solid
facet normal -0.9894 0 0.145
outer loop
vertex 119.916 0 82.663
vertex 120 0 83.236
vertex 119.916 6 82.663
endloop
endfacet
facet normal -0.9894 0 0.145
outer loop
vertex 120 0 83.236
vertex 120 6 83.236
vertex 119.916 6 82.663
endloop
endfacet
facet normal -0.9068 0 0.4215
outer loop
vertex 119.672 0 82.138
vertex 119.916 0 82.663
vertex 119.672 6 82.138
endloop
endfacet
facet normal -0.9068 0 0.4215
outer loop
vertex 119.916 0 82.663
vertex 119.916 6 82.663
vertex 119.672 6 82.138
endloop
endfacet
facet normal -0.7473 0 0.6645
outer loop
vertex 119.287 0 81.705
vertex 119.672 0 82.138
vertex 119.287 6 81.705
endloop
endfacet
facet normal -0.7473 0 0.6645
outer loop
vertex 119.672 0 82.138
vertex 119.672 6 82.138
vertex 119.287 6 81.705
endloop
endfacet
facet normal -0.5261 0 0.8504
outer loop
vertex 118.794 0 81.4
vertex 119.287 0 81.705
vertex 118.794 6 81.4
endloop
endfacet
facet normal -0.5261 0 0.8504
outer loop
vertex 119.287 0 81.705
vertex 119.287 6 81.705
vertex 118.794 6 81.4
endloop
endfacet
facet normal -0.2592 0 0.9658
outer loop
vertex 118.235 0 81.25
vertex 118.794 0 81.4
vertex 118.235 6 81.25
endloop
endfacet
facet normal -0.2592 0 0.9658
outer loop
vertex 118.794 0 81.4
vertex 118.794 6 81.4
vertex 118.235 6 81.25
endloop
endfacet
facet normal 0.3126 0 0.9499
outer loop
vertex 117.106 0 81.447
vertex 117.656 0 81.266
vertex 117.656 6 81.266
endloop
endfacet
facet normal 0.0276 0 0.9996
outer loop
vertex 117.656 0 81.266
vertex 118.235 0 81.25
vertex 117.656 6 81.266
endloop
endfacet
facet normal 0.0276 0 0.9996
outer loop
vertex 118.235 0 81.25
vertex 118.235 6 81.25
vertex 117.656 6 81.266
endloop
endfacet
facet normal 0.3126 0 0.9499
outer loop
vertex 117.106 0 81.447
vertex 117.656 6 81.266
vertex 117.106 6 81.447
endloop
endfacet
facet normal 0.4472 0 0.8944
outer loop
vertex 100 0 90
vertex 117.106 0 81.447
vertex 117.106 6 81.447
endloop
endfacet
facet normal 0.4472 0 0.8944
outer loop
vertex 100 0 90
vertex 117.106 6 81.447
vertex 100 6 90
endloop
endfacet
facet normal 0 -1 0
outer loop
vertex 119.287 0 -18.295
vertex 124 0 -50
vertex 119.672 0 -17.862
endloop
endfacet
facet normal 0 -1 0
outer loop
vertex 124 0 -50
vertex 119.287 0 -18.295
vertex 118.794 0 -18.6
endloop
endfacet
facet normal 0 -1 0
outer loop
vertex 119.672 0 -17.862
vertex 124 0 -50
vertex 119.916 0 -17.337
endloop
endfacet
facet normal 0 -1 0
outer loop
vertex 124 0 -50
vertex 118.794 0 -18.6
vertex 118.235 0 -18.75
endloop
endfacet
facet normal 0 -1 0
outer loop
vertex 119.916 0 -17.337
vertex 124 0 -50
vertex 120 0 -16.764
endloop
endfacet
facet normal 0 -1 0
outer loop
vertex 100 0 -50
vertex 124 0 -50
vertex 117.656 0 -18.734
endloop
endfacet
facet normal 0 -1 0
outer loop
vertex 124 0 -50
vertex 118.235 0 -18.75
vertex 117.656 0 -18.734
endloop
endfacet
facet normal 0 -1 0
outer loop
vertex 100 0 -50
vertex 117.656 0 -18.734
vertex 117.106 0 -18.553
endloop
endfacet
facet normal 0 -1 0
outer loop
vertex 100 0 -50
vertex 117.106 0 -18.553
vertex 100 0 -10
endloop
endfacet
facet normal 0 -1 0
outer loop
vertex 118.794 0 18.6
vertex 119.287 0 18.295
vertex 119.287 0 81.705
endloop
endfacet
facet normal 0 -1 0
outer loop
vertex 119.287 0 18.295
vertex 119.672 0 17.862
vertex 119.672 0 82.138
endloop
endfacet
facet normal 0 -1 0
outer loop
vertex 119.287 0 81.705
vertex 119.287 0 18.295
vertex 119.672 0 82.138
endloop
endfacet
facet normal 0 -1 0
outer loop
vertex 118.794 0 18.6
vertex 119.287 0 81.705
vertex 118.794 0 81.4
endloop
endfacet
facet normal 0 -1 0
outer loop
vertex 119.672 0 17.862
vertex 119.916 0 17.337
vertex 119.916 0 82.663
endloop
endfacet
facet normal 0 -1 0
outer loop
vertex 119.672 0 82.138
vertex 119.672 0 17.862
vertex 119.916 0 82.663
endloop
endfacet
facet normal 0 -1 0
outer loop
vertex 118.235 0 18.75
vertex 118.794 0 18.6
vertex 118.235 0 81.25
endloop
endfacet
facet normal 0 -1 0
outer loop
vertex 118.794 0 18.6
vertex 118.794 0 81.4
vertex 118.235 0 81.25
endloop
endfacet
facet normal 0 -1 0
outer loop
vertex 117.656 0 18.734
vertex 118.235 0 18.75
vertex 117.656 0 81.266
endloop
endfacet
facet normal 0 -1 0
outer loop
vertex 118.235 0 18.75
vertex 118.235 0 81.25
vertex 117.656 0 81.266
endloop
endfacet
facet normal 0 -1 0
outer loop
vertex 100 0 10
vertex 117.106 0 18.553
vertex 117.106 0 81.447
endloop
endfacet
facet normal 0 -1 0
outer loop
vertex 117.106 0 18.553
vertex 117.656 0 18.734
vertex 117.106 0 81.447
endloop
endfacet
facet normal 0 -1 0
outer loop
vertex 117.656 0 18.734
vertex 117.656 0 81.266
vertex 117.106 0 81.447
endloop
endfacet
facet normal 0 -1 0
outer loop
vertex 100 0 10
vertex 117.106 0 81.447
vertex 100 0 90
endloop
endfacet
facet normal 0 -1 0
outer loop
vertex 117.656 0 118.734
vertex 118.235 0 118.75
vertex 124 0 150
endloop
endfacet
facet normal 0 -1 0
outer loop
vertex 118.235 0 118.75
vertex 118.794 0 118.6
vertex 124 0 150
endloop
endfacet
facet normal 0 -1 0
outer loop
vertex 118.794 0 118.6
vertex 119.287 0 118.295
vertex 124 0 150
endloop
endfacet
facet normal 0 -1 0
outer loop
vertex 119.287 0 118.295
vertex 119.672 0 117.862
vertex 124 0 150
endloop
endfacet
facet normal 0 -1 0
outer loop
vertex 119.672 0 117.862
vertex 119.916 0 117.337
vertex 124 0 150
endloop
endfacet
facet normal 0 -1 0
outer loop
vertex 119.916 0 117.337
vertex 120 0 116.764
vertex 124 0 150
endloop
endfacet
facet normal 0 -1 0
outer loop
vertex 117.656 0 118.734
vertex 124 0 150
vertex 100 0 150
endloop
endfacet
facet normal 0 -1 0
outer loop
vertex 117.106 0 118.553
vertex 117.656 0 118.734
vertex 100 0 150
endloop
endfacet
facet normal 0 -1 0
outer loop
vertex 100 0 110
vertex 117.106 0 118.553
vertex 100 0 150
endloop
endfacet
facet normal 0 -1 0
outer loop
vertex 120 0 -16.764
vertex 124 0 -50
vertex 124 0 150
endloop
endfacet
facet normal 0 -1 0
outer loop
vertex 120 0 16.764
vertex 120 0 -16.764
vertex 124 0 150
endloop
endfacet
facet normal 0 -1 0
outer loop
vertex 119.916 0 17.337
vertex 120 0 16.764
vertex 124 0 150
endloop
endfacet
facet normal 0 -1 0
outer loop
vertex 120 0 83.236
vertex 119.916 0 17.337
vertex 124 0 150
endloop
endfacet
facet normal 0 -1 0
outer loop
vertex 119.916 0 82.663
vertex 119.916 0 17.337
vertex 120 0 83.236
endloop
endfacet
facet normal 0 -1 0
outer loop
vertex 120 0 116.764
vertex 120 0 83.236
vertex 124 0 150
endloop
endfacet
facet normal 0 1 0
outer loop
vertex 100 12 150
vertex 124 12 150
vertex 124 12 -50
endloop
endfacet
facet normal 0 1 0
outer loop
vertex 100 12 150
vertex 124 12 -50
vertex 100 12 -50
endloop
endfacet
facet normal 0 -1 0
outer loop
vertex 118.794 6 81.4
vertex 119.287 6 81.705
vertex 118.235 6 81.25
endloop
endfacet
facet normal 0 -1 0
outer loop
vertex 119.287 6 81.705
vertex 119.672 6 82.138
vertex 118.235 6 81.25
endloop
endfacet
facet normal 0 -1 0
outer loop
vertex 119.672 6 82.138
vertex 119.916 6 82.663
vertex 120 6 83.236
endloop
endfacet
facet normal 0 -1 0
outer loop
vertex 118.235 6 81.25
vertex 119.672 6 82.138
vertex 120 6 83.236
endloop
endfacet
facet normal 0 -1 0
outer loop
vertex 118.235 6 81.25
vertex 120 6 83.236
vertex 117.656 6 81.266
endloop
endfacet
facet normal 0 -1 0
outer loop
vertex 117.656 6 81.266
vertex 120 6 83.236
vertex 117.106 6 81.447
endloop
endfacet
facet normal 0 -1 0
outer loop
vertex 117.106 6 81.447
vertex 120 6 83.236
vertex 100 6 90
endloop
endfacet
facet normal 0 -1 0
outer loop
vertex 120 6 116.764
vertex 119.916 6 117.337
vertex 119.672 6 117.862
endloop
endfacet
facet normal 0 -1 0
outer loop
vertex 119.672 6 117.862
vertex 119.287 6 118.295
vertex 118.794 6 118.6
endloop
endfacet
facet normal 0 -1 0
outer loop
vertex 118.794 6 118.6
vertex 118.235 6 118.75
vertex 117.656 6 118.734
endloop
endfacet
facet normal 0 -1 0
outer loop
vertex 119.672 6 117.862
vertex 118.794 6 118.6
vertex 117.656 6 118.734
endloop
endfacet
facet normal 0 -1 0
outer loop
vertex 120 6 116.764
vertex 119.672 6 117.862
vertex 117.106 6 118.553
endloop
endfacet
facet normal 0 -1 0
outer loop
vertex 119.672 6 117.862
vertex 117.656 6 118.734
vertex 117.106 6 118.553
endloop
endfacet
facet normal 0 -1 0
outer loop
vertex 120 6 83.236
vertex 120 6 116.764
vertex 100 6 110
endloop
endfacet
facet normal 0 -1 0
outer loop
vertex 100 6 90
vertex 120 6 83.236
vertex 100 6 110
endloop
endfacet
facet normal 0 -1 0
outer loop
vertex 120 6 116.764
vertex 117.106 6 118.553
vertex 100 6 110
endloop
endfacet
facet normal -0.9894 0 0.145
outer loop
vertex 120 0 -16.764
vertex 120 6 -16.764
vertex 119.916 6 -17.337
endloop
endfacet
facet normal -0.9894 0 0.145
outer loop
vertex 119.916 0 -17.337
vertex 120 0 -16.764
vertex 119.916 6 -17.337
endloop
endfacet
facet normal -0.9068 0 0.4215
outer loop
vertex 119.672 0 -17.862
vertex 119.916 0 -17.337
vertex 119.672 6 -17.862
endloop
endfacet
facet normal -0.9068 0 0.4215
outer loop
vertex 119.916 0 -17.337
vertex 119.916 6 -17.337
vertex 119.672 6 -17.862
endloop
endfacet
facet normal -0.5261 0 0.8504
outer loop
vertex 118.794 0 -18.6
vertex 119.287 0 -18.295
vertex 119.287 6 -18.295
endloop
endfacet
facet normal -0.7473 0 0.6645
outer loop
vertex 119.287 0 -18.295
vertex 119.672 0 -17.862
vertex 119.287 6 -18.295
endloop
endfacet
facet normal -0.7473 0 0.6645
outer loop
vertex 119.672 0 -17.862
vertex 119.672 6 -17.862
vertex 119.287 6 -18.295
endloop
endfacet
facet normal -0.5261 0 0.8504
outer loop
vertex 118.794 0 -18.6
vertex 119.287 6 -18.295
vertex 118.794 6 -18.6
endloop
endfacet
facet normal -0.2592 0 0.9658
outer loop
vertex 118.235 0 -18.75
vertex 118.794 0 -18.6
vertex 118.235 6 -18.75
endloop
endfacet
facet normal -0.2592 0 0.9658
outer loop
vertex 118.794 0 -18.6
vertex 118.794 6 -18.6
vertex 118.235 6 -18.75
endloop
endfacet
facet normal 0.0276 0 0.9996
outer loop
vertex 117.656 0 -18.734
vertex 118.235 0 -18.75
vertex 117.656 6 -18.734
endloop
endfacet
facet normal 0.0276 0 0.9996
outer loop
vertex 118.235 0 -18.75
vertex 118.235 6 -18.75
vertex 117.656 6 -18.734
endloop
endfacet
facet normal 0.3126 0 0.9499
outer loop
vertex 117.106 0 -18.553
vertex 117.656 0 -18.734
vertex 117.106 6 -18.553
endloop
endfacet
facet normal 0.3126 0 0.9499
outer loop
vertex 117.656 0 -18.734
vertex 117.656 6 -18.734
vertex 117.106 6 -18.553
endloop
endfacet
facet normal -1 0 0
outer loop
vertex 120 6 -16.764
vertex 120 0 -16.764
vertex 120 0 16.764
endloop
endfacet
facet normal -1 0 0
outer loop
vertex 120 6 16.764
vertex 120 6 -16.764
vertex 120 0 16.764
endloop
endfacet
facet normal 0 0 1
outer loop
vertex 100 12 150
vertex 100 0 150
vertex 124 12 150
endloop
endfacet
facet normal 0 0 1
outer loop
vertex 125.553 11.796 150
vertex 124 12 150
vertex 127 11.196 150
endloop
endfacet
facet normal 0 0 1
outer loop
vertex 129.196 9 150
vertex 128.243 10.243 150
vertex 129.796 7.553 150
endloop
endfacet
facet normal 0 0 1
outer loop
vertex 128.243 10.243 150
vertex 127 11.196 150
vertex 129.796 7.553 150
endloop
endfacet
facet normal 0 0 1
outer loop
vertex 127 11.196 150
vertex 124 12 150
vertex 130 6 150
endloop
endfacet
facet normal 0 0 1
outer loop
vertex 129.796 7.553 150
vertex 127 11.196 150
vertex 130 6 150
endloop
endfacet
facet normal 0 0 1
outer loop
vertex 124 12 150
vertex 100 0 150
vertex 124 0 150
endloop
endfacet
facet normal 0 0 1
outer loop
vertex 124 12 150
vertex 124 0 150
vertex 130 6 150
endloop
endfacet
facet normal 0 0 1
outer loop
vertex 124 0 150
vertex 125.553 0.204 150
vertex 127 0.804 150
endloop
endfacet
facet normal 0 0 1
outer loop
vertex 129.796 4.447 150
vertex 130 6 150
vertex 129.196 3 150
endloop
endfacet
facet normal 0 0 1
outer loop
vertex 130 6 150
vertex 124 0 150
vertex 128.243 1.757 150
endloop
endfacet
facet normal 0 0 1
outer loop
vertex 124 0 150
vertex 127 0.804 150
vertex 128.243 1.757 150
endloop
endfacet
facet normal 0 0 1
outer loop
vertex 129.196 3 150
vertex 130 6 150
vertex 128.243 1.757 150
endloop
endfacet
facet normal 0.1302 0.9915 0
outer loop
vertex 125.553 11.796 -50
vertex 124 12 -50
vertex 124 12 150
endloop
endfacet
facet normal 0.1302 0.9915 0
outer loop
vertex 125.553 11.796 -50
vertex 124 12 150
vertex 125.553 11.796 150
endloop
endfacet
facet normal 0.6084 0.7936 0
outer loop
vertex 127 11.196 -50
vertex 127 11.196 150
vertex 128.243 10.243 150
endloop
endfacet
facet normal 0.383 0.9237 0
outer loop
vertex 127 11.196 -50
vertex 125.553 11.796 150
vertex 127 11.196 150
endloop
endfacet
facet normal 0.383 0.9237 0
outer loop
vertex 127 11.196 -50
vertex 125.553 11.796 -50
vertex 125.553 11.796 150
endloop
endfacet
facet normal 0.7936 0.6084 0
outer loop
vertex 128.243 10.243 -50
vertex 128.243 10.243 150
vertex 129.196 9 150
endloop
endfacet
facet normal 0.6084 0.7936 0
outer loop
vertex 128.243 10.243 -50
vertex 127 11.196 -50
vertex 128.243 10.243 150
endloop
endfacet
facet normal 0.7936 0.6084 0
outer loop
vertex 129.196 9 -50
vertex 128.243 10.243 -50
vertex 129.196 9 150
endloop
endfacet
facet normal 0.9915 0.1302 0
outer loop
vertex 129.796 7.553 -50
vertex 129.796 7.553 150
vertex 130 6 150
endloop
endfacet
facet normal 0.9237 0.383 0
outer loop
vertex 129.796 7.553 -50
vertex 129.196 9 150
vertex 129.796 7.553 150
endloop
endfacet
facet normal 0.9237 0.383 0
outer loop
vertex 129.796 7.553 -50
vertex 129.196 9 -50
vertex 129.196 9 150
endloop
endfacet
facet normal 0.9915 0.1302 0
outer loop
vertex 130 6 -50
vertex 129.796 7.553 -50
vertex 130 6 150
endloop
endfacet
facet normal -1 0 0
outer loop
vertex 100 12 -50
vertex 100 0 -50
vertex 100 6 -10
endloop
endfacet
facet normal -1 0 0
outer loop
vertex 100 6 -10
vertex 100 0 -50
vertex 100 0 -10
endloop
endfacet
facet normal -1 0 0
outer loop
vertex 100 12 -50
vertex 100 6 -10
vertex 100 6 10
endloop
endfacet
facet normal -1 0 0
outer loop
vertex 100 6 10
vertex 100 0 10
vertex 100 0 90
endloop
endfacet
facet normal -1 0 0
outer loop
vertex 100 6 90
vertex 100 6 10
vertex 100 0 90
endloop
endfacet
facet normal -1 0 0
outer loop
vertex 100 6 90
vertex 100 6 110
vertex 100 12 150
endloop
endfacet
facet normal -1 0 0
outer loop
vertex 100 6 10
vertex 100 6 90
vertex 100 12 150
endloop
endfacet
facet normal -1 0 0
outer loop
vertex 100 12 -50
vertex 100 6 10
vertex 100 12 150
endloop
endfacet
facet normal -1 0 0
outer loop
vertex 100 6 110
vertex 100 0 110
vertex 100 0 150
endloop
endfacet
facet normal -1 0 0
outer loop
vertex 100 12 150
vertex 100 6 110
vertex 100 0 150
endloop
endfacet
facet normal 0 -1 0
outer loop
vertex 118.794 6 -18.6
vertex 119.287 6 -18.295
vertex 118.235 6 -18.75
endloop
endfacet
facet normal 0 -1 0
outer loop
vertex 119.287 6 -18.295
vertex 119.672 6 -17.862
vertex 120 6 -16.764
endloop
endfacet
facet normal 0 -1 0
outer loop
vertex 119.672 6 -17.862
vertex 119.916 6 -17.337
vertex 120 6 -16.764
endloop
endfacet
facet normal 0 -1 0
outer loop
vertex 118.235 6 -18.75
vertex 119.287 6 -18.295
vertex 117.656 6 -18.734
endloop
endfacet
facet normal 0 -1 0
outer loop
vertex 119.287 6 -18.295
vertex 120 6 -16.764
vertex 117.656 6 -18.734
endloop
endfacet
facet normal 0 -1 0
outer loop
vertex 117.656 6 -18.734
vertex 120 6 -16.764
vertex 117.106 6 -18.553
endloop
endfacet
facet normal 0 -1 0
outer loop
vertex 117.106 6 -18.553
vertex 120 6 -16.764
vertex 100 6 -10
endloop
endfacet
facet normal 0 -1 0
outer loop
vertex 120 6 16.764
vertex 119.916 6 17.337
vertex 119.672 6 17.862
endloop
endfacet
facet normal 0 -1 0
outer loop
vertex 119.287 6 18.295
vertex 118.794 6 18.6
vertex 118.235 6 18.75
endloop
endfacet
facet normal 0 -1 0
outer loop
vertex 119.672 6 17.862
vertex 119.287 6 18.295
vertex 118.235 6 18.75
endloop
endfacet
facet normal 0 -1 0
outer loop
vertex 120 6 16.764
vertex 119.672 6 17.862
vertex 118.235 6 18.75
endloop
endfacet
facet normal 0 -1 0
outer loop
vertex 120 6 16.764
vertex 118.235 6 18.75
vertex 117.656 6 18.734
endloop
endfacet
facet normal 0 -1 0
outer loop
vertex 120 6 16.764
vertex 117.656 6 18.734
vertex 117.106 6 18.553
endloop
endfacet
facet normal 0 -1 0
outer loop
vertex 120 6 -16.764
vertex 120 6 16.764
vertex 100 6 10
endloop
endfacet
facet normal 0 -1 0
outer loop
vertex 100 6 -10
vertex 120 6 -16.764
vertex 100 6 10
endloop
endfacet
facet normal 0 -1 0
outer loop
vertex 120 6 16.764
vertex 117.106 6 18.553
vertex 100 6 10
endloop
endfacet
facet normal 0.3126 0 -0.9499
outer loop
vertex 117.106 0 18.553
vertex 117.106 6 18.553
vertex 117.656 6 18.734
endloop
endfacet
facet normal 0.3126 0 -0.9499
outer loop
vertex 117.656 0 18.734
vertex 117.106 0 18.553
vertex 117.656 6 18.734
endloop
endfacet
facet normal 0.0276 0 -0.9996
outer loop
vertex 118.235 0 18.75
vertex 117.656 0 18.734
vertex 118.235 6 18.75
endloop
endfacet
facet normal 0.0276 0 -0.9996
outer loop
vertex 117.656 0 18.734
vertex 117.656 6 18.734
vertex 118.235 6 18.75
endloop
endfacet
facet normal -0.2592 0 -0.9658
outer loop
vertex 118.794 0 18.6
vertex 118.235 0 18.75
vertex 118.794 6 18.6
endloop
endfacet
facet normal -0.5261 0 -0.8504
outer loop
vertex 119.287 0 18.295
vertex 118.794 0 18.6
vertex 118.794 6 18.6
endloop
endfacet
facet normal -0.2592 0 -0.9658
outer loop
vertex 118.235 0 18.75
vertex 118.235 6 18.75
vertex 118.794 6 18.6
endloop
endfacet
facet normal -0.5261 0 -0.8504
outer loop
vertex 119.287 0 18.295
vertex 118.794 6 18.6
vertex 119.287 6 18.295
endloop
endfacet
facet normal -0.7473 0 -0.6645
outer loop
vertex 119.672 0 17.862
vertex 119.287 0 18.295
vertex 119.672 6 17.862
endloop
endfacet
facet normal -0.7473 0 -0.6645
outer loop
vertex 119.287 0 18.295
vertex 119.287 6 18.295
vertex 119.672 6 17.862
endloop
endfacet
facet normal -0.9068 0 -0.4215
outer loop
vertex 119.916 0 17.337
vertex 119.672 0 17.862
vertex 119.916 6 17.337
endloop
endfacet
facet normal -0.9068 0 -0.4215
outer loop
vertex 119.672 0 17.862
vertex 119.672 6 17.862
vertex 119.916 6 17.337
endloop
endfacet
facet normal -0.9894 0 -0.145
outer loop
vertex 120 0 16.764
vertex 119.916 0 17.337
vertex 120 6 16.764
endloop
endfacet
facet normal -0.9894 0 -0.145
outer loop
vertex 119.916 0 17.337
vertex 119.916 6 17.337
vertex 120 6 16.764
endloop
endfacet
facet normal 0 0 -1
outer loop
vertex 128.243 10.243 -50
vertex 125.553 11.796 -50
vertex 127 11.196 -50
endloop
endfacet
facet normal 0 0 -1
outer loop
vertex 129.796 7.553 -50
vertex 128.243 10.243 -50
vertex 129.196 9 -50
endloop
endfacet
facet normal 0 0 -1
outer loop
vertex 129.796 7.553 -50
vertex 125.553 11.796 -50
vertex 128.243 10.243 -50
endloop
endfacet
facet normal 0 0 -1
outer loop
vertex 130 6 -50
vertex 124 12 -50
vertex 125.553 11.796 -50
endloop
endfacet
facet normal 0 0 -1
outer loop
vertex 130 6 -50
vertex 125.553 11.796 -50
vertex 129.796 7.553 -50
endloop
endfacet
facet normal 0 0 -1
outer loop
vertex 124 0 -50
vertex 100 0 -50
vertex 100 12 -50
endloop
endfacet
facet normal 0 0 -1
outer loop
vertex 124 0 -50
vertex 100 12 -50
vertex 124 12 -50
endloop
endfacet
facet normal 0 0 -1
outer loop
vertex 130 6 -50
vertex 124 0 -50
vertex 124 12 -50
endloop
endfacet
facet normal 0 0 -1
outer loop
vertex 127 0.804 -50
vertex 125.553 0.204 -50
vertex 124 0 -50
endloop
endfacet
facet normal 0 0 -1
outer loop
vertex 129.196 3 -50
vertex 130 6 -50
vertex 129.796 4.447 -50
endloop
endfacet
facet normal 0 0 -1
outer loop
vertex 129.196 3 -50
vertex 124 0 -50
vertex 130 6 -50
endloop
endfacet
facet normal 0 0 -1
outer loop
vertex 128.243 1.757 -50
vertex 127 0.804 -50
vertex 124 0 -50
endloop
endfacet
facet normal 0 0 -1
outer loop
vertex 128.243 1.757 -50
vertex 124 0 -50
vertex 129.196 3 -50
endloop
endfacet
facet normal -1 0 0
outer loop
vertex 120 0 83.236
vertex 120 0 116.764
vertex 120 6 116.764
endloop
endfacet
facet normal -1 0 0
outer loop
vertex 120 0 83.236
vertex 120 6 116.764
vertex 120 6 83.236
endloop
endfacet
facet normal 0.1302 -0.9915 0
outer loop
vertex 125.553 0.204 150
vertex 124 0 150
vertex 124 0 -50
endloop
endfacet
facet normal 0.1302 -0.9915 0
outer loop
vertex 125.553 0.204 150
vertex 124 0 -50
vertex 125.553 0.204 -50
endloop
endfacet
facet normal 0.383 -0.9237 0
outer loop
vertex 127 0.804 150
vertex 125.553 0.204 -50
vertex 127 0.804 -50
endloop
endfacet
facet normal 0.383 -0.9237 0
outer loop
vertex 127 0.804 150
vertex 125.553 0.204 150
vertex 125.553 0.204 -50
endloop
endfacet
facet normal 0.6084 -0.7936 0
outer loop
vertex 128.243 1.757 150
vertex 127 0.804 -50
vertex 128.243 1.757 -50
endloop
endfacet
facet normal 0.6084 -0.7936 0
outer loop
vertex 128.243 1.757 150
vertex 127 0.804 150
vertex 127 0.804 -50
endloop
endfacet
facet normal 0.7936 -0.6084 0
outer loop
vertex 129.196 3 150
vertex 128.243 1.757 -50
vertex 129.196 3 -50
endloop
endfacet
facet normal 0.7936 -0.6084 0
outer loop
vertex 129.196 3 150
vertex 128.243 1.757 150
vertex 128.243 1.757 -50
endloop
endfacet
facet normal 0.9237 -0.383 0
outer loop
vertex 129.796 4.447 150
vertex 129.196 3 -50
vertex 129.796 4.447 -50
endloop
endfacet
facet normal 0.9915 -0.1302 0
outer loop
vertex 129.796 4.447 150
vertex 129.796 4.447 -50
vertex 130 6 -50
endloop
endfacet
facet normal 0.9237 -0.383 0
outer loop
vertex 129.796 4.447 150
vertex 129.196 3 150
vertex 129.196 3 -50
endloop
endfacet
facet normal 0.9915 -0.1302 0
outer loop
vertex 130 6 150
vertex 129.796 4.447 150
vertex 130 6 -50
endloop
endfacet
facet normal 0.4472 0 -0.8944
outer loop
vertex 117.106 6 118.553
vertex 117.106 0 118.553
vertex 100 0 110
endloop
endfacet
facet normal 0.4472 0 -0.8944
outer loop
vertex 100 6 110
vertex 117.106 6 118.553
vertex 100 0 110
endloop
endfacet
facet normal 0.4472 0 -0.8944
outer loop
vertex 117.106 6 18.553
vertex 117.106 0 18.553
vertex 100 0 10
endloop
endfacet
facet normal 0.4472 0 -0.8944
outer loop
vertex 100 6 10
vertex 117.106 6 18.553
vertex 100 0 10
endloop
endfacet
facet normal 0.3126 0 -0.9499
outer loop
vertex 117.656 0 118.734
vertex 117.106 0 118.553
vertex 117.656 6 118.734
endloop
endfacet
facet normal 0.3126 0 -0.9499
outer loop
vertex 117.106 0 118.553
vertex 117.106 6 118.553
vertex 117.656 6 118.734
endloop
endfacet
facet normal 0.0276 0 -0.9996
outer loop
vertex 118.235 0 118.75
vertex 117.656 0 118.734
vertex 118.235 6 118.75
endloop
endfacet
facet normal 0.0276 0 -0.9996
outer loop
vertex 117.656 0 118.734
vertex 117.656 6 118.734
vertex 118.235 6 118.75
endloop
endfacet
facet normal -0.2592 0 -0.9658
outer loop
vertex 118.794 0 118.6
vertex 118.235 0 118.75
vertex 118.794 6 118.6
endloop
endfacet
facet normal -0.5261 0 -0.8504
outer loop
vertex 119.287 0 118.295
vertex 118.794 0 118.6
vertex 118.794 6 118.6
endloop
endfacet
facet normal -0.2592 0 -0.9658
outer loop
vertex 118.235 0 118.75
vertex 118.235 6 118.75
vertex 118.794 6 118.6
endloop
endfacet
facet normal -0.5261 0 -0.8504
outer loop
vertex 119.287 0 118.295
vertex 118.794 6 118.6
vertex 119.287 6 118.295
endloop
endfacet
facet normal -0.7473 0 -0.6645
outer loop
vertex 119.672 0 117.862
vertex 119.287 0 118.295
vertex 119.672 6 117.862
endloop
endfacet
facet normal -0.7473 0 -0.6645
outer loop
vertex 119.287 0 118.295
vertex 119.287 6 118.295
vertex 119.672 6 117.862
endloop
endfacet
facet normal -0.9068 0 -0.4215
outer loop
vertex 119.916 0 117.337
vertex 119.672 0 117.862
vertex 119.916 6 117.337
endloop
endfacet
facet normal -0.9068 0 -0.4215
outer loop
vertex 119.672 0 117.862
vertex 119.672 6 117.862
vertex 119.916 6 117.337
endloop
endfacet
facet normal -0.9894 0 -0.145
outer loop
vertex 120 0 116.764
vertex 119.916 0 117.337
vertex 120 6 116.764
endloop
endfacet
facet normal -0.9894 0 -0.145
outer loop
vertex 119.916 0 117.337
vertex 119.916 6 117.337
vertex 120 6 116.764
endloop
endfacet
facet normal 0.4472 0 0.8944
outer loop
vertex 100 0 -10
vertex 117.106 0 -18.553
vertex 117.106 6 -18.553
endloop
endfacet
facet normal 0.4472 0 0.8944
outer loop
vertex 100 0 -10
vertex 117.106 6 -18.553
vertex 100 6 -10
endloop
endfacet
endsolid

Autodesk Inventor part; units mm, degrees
ref_plane "YZ Plane" through (0, 0, 0) normal (1, 0, 0) x (0, 1, 0)
ref_plane "XZ Plane" through (0, 0, 0) normal (0, 1, 0) x (-1, 0, 0)
ref_plane "XY Plane" through (0, 0, 0) normal (0, 0, 1) x (1, 0, 0)
sketch "Sketch1" plane through (0, 0, 0) normal (0, 1, 0) x (-1, 0, 0)
  line L0 (100, -50) -> (-100, -50)
  line L1 (-100, -50) -> (-100, 50)
  line L2 (-100, 50) -> (100, 50)
  line L3 (100, 50) -> (100, -50)
  line L4 (100, -50) -> (-100, 50) construction
  line L5 (-100, -50) -> (100, 50) construction
  line L6 (-40, -30) -> (-80, -30)
  line L7 (-50, -50) -> (-70, -50)
  line L8 (-40, -30) -> (-50, -50)
  line L9 (-80, -30) -> (-70, -50)
  line L10 (80, -30) -> (40, -30)
  line L11 (70, -50) -> (50, -50)
  line L12 (80, -30) -> (70, -50)
  line L13 (40, -30) -> (50, -50)
  line L14 (-100, -10) -> (-100, 10)
  line L15 (-80, -20) -> (-80, 20)
  line L16 (-80, -20) -> (-100, -10)
  line L17 (-80, 20) -> (-100, 10)
  line L18 (100, -50) -> (-100, -50)
  line L19 (-100, -50) -> (-130, -50)
  line L20 (-130, -50) -> (-130, 50)
  line L21 (-130, 50) -> (-100, 50)
  line L22 (-100, 50) -> (-100, -50)
  line L23 (-120, -20) -> (-120, 20)
  line L24 (-120, -20) -> (-100, -10)
  line L25 (-120, 20) -> (-100, 10)
  line L26 (-100, 150) -> (-100, 50)
  line L27 (-100, 150) -> (-130, 150)
  line L28 (-130, 150) -> (-130, 50)
  line L29 (-120, 120) -> (-100, 110)
  line L30 (-120, 120) -> (-120, 80)
  line L31 (-120, 80) -> (-100, 90)
  point P0 (0, 0)
  point P1 (-100, 10)
  point P2 (-100, -10)
  point P3 (-70, -50)
  point P4 (-50, -50)
  point P5 (70, -50)
  point P6 (0, 0)
  point P7 (0, 0)
  point P8 (-100, -50)
  dimension "d72" = 200
  dimension "d73" = 100
  dimension "d78" = 20
  dimension "d79" = 40
  dimension "d80" = 20
  dimension "d81" = 10
  dimension "d82" = 20
  dimension "d83" = 40
  dimension "d84" = 20
  dimension "d85" = 10
  dimension "d86" = 120
  dimension "d87" = 30
  dimension "d88" = 0
  dimension "d89" = 0
  dimension "d90" = 40
  dimension "d91" = 20
  dimension "d92" = 20
  dimension "d93" = 10
  dimension "d94" = 40
  dimension "d95" = 0
  dimension "d122" = 30
extrude "Extrusion26" add sketch "Sketch1" along normal blind 12 contours L1 L25 L23 L24 L19 L20 L21 | L21 L28 L27 L26 L29 L30 L31 | L1 L24 L23 L25 | L31 L30 L29 L26
extrude "Extrusion27" cut sketch "Sketch1" along normal blind 6 contours L1 L24 L23 L25 | L31 L30 L29 L26
fillet "Fillet13" radius 2 4 edges at (120, 3, 120) (120, 3, 80) (120, 3, 20) (120, 3, -20)
fillet "Fillet14" radius 6 2 edges at (130, 12, 50) (130, 0, 50)
properties part number "Test2_3DPrint"
